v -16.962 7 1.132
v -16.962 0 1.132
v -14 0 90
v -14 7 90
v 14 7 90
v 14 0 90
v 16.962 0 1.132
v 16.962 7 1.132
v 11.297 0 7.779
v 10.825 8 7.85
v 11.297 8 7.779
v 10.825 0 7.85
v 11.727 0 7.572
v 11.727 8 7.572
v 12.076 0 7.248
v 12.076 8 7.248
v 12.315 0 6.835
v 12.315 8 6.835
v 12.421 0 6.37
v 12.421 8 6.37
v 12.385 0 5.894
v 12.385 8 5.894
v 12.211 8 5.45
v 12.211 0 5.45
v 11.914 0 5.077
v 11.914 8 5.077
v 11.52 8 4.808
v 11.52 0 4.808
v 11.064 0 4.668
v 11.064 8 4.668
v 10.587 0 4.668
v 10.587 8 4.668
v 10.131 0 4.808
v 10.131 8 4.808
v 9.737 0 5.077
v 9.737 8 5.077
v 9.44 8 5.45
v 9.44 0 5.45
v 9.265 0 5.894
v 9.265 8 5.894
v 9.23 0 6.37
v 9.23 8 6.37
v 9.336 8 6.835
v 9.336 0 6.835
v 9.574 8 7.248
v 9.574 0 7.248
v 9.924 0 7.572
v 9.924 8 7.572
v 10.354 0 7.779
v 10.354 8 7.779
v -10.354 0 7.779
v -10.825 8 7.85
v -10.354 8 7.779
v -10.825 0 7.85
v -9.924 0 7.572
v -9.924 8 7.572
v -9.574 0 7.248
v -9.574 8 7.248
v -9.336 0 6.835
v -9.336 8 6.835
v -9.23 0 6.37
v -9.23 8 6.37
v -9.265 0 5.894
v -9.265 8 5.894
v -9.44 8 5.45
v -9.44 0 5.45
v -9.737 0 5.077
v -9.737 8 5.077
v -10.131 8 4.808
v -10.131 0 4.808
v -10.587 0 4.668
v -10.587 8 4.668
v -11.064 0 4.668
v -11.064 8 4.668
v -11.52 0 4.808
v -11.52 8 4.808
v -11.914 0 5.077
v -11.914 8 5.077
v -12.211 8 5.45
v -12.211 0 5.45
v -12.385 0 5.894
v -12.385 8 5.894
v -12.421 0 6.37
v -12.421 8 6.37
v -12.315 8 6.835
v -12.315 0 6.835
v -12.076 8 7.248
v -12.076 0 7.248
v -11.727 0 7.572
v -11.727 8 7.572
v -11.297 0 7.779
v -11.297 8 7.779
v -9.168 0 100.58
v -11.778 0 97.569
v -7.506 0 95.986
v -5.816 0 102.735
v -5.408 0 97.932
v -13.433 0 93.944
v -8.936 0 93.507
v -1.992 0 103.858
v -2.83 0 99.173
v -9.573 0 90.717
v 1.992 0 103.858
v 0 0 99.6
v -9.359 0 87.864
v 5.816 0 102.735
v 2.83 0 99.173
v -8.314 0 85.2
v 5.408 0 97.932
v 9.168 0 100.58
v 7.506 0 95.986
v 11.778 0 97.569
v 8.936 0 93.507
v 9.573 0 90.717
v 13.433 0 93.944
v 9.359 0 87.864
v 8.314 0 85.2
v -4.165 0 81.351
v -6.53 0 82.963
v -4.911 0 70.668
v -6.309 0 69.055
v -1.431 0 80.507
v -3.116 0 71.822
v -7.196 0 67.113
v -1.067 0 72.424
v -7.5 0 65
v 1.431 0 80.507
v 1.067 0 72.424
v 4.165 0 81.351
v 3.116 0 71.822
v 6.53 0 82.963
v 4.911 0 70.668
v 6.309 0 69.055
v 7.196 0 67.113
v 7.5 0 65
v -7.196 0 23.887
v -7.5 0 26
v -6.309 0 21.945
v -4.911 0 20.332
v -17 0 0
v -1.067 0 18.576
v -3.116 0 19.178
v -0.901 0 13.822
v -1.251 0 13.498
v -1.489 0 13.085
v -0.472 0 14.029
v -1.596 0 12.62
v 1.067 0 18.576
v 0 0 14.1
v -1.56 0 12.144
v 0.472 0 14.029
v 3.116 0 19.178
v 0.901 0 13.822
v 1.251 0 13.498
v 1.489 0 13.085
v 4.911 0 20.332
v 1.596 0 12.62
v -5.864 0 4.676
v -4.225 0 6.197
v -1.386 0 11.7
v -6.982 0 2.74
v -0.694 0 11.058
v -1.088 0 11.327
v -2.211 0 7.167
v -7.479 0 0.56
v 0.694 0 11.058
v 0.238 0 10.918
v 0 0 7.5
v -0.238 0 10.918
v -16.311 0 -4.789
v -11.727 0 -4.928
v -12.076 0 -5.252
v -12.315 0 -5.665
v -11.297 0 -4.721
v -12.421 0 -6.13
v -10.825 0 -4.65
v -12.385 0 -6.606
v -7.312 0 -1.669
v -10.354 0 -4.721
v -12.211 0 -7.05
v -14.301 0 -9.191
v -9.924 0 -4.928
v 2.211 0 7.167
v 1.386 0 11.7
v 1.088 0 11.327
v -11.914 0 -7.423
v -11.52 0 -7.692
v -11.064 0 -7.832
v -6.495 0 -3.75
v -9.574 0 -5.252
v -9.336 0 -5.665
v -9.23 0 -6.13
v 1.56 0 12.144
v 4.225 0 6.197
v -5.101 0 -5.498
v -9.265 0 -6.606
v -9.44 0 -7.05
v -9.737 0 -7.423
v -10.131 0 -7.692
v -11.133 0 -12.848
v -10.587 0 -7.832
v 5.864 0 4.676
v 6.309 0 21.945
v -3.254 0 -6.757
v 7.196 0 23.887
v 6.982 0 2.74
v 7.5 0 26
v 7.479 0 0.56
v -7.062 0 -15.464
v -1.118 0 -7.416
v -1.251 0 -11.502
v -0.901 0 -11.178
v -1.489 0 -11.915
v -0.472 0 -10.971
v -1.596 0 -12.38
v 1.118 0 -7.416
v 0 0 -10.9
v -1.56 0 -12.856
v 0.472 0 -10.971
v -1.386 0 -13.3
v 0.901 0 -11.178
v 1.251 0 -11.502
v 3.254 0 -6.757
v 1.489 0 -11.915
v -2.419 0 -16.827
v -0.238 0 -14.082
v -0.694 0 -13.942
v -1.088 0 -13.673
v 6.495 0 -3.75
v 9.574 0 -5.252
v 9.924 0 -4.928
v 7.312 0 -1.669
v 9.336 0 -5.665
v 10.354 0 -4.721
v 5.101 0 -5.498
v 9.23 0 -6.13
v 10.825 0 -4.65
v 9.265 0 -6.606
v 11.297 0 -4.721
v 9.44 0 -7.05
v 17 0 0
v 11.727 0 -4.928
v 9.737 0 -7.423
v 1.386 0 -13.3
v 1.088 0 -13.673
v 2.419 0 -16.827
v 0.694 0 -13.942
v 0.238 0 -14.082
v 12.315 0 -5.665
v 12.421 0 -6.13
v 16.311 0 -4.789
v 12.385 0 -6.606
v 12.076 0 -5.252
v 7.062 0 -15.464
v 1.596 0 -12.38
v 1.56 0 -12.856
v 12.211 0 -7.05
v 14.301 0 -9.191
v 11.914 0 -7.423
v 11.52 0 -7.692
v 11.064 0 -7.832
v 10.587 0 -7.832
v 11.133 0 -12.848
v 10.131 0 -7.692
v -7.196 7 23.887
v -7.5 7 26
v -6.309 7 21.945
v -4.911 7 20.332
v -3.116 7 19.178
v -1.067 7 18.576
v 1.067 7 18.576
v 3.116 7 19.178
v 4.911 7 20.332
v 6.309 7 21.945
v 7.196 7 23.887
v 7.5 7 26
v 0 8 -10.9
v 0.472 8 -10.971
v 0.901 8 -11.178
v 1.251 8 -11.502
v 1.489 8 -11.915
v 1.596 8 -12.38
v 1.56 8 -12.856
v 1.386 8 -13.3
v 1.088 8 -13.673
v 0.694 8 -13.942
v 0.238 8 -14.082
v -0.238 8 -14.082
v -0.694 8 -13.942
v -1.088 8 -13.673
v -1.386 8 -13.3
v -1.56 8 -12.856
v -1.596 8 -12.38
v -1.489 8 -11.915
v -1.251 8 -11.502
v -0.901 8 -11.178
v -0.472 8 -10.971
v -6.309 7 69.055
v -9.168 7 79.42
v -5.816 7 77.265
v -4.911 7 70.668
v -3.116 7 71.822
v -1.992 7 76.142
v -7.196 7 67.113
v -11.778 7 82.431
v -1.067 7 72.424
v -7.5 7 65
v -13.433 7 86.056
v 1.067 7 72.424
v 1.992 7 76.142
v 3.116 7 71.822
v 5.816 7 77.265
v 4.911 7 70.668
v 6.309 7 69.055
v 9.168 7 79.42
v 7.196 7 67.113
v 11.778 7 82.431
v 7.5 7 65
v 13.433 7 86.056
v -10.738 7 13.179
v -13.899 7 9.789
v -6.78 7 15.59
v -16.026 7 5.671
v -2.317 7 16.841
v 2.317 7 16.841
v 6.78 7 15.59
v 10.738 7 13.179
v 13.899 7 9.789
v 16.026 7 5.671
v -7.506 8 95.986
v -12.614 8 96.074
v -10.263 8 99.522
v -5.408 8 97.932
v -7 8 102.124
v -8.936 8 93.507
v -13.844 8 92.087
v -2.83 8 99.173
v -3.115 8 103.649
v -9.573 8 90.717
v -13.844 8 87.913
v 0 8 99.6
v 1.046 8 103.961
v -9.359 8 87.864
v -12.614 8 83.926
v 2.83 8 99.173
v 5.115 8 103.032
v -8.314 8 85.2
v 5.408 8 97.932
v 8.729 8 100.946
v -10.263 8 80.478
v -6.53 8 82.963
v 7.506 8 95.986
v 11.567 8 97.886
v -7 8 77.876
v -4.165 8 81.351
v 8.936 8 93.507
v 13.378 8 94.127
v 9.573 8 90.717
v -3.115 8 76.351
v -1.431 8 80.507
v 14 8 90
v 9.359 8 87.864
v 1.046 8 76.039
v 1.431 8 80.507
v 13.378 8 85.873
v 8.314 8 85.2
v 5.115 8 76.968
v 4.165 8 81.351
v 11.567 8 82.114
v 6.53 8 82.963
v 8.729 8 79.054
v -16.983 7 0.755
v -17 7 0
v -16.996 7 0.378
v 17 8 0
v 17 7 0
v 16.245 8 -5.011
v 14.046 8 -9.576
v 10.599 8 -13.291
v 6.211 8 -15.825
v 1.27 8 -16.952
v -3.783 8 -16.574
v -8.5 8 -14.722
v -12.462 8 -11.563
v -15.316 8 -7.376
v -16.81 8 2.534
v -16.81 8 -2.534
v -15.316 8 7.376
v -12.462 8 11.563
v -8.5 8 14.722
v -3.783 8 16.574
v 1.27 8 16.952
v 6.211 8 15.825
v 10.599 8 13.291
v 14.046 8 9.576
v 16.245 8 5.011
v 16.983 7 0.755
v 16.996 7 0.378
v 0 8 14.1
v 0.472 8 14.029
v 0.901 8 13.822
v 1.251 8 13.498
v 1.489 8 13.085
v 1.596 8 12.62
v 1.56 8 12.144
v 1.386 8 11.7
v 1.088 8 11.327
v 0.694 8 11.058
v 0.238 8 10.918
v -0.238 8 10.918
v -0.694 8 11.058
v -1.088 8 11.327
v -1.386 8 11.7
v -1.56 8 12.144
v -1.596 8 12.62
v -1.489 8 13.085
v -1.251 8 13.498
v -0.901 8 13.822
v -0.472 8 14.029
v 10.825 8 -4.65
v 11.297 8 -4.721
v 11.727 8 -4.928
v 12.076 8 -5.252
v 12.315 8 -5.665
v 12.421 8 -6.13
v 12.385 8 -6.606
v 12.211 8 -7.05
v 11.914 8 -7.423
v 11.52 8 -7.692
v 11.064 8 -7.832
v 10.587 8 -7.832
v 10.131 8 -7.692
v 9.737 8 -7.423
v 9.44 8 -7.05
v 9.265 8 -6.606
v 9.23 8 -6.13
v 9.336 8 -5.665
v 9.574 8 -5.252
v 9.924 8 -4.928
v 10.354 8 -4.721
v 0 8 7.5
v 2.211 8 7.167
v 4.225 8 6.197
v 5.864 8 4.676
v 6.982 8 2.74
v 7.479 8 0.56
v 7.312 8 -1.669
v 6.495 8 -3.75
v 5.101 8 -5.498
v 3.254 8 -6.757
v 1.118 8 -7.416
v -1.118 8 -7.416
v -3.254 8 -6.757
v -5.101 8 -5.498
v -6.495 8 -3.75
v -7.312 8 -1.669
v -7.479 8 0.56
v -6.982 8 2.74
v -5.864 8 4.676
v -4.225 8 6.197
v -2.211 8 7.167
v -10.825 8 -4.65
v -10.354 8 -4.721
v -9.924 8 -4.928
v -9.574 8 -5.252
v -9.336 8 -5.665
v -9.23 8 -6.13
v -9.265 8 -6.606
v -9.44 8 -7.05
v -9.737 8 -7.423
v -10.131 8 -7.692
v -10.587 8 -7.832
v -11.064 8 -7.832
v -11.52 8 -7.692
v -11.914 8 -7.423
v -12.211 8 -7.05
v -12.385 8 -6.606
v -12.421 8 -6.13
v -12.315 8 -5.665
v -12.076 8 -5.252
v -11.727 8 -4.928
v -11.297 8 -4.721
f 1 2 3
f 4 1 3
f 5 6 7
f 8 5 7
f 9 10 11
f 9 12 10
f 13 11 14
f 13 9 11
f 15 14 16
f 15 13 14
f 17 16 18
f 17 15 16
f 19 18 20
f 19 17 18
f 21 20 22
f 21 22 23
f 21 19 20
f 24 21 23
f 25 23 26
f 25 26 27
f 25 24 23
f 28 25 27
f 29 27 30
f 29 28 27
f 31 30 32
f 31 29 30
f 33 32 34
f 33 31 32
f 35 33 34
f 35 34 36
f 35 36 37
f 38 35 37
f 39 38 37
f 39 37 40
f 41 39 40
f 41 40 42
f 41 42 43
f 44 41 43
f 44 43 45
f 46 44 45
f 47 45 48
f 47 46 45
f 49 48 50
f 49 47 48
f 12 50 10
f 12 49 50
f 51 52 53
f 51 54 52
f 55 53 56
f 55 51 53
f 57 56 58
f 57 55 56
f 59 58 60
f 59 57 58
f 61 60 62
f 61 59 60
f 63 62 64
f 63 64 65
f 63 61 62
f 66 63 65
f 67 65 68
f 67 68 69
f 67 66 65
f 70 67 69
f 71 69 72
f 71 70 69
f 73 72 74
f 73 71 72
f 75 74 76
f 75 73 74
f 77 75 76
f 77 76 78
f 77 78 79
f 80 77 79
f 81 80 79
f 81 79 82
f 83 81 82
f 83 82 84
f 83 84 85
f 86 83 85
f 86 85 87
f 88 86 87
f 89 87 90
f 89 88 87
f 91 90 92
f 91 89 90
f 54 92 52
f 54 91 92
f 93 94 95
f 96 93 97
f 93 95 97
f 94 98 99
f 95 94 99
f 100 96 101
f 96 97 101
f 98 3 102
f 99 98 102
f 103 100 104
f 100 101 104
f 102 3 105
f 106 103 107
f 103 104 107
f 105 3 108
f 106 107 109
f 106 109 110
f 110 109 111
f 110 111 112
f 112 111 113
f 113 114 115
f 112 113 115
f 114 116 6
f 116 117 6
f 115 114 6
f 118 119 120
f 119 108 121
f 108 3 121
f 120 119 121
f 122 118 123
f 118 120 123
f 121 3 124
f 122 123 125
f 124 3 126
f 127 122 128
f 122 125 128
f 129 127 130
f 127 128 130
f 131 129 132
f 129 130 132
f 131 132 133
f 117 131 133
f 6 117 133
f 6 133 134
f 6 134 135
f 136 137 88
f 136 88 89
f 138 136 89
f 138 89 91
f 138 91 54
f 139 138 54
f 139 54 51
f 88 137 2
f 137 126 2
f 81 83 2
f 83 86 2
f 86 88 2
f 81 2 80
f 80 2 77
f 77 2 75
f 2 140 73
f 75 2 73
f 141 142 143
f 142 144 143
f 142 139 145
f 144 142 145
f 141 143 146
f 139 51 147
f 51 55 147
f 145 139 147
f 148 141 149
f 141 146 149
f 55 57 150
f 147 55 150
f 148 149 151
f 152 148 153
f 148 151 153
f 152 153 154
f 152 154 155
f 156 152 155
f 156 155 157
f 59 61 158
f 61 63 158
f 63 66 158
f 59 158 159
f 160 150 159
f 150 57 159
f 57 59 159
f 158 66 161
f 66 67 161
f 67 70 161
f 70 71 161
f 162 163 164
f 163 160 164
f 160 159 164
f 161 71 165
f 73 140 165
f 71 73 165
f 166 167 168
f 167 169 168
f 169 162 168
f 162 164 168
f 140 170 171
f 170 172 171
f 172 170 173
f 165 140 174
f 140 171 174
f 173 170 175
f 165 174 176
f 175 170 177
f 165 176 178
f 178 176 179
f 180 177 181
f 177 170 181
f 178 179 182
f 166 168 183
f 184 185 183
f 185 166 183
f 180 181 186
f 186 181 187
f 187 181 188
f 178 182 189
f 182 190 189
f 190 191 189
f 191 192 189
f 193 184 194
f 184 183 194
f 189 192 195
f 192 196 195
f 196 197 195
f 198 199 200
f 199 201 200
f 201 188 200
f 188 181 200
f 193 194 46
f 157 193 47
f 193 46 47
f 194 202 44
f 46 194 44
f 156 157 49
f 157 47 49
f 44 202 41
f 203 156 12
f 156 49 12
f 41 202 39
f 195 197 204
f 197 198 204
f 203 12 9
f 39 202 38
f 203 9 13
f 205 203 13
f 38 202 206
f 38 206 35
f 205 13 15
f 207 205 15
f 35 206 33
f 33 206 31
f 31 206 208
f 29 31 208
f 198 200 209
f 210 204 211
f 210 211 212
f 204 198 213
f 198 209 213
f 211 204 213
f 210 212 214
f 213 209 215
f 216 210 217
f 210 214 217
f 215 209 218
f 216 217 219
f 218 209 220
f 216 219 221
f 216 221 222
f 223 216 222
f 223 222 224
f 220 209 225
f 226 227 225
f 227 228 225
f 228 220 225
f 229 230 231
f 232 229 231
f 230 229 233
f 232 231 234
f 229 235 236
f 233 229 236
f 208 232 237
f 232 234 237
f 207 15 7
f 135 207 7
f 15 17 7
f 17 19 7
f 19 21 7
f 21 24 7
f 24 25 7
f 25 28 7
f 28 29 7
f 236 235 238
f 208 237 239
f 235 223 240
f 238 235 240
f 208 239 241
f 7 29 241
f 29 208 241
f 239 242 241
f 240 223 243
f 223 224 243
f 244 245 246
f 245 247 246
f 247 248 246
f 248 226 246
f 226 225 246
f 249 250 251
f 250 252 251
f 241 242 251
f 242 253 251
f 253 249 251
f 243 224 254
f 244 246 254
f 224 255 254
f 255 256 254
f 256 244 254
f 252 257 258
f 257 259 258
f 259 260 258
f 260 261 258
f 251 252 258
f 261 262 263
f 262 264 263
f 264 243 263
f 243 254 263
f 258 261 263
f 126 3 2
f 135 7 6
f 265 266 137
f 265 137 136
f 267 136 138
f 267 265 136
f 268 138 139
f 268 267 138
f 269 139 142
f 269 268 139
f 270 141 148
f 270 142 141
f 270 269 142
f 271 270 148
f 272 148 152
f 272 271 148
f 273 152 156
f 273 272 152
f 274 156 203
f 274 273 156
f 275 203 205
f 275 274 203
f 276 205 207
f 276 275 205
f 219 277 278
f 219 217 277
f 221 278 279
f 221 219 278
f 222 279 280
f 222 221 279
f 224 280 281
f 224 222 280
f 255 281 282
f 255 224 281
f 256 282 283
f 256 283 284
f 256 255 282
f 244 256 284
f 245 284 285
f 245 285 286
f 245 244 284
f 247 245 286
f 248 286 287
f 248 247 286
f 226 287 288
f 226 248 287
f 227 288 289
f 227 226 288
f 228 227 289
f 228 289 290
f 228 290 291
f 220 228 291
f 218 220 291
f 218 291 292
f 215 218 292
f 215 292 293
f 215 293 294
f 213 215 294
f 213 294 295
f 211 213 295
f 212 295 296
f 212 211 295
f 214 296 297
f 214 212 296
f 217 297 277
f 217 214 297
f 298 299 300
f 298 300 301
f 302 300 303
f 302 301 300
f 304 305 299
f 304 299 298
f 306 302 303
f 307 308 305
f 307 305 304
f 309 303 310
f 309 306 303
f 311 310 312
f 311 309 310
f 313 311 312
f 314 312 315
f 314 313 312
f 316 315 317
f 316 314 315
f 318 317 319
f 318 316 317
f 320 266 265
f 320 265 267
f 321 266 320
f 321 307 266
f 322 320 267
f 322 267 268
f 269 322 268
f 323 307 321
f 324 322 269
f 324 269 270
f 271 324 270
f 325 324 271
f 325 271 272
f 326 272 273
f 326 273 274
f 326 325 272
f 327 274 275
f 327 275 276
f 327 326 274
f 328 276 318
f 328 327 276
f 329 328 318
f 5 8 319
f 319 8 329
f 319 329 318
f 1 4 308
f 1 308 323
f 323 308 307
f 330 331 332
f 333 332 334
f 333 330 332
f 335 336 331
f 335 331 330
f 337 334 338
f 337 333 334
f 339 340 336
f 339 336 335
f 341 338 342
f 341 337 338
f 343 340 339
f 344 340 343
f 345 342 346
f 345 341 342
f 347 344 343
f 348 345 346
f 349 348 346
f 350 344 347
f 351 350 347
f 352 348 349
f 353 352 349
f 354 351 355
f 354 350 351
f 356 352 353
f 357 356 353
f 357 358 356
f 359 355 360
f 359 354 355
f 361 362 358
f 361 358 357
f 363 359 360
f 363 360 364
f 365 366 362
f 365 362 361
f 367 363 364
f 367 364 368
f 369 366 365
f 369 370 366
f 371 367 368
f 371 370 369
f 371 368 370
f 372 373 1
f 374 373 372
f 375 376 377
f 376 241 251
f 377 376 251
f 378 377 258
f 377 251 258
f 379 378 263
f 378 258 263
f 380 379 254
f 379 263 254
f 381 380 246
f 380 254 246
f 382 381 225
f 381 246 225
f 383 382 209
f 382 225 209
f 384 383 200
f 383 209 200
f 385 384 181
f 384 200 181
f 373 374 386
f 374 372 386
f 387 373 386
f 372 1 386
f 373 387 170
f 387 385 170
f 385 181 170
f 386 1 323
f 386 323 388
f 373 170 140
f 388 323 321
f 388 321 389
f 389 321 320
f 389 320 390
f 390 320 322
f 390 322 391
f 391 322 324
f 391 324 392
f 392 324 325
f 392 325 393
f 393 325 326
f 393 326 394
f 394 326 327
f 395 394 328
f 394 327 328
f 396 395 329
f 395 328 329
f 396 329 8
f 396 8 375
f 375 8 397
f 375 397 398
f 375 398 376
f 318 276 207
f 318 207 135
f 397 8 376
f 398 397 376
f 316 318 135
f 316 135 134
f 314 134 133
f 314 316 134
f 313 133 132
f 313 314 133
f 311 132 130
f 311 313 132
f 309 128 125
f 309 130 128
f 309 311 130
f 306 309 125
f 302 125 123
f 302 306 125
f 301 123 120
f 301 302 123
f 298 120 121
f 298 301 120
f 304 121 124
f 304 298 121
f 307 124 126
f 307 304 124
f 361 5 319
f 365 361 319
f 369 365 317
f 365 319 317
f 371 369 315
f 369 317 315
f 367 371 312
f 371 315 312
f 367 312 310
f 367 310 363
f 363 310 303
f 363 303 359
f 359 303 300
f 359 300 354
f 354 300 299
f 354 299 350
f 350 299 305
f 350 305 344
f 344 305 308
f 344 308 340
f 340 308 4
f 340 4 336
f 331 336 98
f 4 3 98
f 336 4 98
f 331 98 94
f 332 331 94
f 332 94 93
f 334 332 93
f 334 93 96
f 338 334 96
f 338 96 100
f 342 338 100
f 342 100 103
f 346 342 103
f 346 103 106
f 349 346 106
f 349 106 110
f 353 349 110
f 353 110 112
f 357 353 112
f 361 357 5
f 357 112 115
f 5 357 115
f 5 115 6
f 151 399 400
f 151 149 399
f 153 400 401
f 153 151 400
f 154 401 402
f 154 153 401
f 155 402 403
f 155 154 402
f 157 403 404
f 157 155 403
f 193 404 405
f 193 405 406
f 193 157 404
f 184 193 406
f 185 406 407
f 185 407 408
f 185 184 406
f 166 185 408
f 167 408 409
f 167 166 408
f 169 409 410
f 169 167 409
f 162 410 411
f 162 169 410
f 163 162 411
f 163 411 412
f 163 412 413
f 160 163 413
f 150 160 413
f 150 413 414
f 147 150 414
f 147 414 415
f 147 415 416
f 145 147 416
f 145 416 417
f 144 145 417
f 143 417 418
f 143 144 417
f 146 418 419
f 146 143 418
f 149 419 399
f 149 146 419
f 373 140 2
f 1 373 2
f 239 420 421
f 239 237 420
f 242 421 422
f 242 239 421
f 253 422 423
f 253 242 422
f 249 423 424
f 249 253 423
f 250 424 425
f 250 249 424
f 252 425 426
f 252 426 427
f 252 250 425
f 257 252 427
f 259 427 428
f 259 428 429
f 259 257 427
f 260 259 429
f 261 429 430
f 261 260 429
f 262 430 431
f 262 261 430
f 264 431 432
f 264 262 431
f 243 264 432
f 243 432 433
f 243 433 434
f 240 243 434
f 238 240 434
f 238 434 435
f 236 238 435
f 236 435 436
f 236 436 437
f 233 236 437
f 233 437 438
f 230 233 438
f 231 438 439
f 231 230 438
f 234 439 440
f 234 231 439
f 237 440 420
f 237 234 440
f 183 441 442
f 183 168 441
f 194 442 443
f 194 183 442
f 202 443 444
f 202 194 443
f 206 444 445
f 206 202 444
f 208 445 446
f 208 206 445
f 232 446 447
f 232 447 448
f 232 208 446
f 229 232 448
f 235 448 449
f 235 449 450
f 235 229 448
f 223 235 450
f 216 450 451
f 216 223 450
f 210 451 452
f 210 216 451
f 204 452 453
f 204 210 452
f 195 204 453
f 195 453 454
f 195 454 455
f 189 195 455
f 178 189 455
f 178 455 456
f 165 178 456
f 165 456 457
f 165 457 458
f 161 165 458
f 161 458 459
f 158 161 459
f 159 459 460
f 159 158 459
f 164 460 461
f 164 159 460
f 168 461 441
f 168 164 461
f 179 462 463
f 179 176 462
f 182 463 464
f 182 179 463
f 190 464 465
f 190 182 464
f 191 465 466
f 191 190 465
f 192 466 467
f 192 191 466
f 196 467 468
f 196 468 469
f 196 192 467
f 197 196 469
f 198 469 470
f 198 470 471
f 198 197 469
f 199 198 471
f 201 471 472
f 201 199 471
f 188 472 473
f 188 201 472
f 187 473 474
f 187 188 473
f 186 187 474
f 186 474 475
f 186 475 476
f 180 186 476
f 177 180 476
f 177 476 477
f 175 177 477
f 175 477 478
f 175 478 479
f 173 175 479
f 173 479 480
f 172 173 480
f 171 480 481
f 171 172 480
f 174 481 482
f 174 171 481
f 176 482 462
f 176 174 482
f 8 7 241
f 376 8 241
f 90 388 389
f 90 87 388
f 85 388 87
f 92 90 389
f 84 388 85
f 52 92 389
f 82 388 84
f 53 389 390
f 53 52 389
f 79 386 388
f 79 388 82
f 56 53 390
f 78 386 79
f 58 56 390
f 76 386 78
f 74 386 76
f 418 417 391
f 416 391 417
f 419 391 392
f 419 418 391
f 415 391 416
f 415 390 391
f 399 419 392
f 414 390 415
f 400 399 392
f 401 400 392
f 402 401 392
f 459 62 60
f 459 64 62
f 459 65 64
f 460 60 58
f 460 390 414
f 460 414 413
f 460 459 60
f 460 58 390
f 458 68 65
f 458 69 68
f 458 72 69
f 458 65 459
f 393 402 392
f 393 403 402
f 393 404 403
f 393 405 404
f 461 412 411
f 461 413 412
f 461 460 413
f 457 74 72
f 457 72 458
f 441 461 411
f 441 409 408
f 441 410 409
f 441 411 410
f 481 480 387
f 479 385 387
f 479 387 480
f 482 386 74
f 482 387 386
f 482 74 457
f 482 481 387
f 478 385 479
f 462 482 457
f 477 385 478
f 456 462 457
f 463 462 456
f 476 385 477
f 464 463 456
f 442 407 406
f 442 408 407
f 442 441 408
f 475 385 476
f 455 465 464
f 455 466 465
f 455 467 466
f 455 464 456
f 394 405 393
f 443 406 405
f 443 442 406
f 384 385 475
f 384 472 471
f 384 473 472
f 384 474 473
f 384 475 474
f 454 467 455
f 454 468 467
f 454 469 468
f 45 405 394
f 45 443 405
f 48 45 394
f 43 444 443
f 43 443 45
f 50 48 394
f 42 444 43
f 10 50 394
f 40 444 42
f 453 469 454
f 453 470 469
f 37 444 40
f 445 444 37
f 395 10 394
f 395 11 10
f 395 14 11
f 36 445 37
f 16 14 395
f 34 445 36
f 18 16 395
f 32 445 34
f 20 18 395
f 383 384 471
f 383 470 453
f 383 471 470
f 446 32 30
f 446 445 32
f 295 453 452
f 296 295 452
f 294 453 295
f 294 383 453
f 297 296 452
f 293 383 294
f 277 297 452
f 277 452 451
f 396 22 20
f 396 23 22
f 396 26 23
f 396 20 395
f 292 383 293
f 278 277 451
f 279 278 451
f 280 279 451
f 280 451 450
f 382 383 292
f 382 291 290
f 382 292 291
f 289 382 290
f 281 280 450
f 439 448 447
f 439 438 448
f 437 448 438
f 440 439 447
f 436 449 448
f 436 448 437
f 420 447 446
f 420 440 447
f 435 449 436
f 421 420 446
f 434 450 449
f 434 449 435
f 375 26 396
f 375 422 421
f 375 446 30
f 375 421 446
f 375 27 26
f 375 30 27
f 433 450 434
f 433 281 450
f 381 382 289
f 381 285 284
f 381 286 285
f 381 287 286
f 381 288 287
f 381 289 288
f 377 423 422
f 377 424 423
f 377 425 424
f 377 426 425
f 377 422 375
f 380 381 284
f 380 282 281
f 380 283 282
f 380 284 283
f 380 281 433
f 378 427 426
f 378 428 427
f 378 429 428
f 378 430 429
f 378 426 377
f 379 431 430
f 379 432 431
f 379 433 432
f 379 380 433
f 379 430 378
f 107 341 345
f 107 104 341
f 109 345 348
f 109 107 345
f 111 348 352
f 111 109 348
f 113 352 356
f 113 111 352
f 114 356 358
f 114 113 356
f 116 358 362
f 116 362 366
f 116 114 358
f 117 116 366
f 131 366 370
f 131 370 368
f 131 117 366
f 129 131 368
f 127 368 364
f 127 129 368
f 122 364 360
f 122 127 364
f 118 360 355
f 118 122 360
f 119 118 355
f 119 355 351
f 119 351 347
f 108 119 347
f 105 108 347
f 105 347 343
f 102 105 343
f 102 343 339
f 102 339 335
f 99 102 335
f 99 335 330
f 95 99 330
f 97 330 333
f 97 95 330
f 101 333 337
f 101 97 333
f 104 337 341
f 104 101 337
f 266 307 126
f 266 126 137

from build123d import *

# Parameters (mm, degrees)
SKETCH_2_R          = 14
SKETCH_2_R_2        = 9.6
SKETCH_2_R_3        = 1.6
SKETCH_2_R_4        = 7.5
EXTRUDE_1_DEPTH     = 7
CUT_EXTRUDE_1_DEPTH = 8
SKETCH_5_R          = 14
SKETCH_5_R_2        = 9.6
EXTRUDE_3_DEPTH     = 1
SKETCH_6_R          = 17
SKETCH_6_R_2        = 7.5
SKETCH_6_R_3        = 1.6
EXTRUDE_4_DEPTH     = 1


with BuildPart() as part:
    # 草图2 → 凸台-拉伸1 (new body)
    # profile 1 of 3: a face of its own
    with BuildSketch(Plane(origin=(0, 0, 0), x_dir=(1, 0, 0), z_dir=(0, 1, 0))):
        with BuildLine():
            Line((-16.962264151, -1.132075472), (-14, -90))
            ThreePointArc((-14, -90), (0, -76), (14, -90))
            Line((14, -90), (16.962264151, -1.132075472))
            ThreePointArc((16.962264151, -1.132075472), (0, -17), (-16.962264151, -1.132075472))
        make_face()
    # profile 2 of 3: a face of its own
    with BuildSketch(Plane(origin=(0, 0, 0), x_dir=(1, 0, 0), z_dir=(0, 1, 0))):
        with Locations((0, -90)):
            Circle(SKETCH_2_R)
        with Locations(Location((0, -90, 0), (0, 0, 270))):
            Circle(SKETCH_2_R_2, mode=Mode.SUBTRACT)
    # profile 3 of 3: a face of its own
    with BuildSketch(Plane(origin=(0, 0, 0), x_dir=(1, 0, 0), z_dir=(0, 1, 0))):
        with BuildLine():
            Line((-17, 0), (-16.962264151, -1.132075472))
            ThreePointArc((-16.962264151, -1.132075472), (0, -17), (16.962264151, -1.132075472))
            Line((16.962264151, -1.132075472), (17, 0))
            ThreePointArc((17, 0), (0, 17), (-17, 0))
        make_face()
        with Locations(Location((-10.825317547, -6.25, 0), (0, 0, 270))):
            Circle(SKETCH_2_R_3, mode=Mode.SUBTRACT)
        with Locations(Location((-10.825317547, 6.25, 0), (0, 0, 270))):
            Circle(SKETCH_2_R_3, mode=Mode.SUBTRACT)
        with Locations(Location((0, -12.5, 0), (0, 0, 270))):
            Circle(SKETCH_2_R_3, mode=Mode.SUBTRACT)
        with Locations(Location((0, 0, 0), (0, 0, 270))):
            Circle(SKETCH_2_R_4, mode=Mode.SUBTRACT)
        with Locations(Location((0, 12.5, 0), (0, 0, 270))):
            Circle(SKETCH_2_R_3, mode=Mode.SUBTRACT)
        with Locations(Location((10.825317547, -6.25, 0), (0, 0, 270))):
            Circle(SKETCH_2_R_3, mode=Mode.SUBTRACT)
        with Locations(Location((10.825317547, 6.25, 0), (0, 0, 270))):
            Circle(SKETCH_2_R_3, mode=Mode.SUBTRACT)
    extrude(amount=EXTRUDE_1_DEPTH)

    # 草图4 → 切除-拉伸1 (cut)
    with BuildSketch(Plane(origin=(0, 7, 0), x_dir=(1, 0, 0), z_dir=(0, 1, 0))):
        with BuildLine():
            Line((7.5, -26), (7.5, -65))
            ThreePointArc((7.5, -65), (0, -72.5), (-7.5, -65))
            Line((-7.5, -65), (-7.5, -26))
            ThreePointArc((-7.5, -26), (0, -18.5), (7.5, -26))
        make_face()
    extrude(amount=-CUT_EXTRUDE_1_DEPTH, mode=Mode.SUBTRACT)

    # 草图5 → 凸台-拉伸3 (add)
    with BuildSketch(Plane(origin=(0, 7, 0), x_dir=(1, 0, 0), z_dir=(0, 1, 0))):
        with Locations((0, -90)):
            Circle(SKETCH_5_R)
        with Locations(Location((0, -90, 0), (0, 0, 270))):
            Circle(SKETCH_5_R_2, mode=Mode.SUBTRACT)
    extrude(amount=EXTRUDE_3_DEPTH)

    # 草图6 → 凸台-拉伸4 (add)
    with BuildSketch(Plane(origin=(0, 7, 0), x_dir=(1, 0, 0), z_dir=(0, 1, 0))):
        Circle(SKETCH_6_R)
        with Locations(Location((0, 0, 0), (0, 0, 270))):
            Circle(SKETCH_6_R_2, mode=Mode.SUBTRACT)
        with Locations(Location((0, 12.5, 0), (0, 0, 270))):
            Circle(SKETCH_6_R_3, mode=Mode.SUBTRACT)
        with Locations(Location((10.825317547, 6.25, 0), (0, 0, 270))):
            Circle(SKETCH_6_R_3, mode=Mode.SUBTRACT)
        with Locations(Location((10.825317547, -6.25, 0), (0, 0, 270))):
            Circle(SKETCH_6_R_3, mode=Mode.SUBTRACT)
        with Locations(Location((0, -12.5, 0), (0, 0, 270))):
            Circle(SKETCH_6_R_3, mode=Mode.SUBTRACT)
        with Locations(Location((-10.825317547, -6.25, 0), (0, 0, 270))):
            Circle(SKETCH_6_R_3, mode=Mode.SUBTRACT)
        with Locations(Location((-10.825317547, 6.25, 0), (0, 0, 270))):
            Circle(SKETCH_6_R_3, mode=Mode.SUBTRACT)
    extrude(amount=EXTRUDE_4_DEPTH)


solid = part.part
